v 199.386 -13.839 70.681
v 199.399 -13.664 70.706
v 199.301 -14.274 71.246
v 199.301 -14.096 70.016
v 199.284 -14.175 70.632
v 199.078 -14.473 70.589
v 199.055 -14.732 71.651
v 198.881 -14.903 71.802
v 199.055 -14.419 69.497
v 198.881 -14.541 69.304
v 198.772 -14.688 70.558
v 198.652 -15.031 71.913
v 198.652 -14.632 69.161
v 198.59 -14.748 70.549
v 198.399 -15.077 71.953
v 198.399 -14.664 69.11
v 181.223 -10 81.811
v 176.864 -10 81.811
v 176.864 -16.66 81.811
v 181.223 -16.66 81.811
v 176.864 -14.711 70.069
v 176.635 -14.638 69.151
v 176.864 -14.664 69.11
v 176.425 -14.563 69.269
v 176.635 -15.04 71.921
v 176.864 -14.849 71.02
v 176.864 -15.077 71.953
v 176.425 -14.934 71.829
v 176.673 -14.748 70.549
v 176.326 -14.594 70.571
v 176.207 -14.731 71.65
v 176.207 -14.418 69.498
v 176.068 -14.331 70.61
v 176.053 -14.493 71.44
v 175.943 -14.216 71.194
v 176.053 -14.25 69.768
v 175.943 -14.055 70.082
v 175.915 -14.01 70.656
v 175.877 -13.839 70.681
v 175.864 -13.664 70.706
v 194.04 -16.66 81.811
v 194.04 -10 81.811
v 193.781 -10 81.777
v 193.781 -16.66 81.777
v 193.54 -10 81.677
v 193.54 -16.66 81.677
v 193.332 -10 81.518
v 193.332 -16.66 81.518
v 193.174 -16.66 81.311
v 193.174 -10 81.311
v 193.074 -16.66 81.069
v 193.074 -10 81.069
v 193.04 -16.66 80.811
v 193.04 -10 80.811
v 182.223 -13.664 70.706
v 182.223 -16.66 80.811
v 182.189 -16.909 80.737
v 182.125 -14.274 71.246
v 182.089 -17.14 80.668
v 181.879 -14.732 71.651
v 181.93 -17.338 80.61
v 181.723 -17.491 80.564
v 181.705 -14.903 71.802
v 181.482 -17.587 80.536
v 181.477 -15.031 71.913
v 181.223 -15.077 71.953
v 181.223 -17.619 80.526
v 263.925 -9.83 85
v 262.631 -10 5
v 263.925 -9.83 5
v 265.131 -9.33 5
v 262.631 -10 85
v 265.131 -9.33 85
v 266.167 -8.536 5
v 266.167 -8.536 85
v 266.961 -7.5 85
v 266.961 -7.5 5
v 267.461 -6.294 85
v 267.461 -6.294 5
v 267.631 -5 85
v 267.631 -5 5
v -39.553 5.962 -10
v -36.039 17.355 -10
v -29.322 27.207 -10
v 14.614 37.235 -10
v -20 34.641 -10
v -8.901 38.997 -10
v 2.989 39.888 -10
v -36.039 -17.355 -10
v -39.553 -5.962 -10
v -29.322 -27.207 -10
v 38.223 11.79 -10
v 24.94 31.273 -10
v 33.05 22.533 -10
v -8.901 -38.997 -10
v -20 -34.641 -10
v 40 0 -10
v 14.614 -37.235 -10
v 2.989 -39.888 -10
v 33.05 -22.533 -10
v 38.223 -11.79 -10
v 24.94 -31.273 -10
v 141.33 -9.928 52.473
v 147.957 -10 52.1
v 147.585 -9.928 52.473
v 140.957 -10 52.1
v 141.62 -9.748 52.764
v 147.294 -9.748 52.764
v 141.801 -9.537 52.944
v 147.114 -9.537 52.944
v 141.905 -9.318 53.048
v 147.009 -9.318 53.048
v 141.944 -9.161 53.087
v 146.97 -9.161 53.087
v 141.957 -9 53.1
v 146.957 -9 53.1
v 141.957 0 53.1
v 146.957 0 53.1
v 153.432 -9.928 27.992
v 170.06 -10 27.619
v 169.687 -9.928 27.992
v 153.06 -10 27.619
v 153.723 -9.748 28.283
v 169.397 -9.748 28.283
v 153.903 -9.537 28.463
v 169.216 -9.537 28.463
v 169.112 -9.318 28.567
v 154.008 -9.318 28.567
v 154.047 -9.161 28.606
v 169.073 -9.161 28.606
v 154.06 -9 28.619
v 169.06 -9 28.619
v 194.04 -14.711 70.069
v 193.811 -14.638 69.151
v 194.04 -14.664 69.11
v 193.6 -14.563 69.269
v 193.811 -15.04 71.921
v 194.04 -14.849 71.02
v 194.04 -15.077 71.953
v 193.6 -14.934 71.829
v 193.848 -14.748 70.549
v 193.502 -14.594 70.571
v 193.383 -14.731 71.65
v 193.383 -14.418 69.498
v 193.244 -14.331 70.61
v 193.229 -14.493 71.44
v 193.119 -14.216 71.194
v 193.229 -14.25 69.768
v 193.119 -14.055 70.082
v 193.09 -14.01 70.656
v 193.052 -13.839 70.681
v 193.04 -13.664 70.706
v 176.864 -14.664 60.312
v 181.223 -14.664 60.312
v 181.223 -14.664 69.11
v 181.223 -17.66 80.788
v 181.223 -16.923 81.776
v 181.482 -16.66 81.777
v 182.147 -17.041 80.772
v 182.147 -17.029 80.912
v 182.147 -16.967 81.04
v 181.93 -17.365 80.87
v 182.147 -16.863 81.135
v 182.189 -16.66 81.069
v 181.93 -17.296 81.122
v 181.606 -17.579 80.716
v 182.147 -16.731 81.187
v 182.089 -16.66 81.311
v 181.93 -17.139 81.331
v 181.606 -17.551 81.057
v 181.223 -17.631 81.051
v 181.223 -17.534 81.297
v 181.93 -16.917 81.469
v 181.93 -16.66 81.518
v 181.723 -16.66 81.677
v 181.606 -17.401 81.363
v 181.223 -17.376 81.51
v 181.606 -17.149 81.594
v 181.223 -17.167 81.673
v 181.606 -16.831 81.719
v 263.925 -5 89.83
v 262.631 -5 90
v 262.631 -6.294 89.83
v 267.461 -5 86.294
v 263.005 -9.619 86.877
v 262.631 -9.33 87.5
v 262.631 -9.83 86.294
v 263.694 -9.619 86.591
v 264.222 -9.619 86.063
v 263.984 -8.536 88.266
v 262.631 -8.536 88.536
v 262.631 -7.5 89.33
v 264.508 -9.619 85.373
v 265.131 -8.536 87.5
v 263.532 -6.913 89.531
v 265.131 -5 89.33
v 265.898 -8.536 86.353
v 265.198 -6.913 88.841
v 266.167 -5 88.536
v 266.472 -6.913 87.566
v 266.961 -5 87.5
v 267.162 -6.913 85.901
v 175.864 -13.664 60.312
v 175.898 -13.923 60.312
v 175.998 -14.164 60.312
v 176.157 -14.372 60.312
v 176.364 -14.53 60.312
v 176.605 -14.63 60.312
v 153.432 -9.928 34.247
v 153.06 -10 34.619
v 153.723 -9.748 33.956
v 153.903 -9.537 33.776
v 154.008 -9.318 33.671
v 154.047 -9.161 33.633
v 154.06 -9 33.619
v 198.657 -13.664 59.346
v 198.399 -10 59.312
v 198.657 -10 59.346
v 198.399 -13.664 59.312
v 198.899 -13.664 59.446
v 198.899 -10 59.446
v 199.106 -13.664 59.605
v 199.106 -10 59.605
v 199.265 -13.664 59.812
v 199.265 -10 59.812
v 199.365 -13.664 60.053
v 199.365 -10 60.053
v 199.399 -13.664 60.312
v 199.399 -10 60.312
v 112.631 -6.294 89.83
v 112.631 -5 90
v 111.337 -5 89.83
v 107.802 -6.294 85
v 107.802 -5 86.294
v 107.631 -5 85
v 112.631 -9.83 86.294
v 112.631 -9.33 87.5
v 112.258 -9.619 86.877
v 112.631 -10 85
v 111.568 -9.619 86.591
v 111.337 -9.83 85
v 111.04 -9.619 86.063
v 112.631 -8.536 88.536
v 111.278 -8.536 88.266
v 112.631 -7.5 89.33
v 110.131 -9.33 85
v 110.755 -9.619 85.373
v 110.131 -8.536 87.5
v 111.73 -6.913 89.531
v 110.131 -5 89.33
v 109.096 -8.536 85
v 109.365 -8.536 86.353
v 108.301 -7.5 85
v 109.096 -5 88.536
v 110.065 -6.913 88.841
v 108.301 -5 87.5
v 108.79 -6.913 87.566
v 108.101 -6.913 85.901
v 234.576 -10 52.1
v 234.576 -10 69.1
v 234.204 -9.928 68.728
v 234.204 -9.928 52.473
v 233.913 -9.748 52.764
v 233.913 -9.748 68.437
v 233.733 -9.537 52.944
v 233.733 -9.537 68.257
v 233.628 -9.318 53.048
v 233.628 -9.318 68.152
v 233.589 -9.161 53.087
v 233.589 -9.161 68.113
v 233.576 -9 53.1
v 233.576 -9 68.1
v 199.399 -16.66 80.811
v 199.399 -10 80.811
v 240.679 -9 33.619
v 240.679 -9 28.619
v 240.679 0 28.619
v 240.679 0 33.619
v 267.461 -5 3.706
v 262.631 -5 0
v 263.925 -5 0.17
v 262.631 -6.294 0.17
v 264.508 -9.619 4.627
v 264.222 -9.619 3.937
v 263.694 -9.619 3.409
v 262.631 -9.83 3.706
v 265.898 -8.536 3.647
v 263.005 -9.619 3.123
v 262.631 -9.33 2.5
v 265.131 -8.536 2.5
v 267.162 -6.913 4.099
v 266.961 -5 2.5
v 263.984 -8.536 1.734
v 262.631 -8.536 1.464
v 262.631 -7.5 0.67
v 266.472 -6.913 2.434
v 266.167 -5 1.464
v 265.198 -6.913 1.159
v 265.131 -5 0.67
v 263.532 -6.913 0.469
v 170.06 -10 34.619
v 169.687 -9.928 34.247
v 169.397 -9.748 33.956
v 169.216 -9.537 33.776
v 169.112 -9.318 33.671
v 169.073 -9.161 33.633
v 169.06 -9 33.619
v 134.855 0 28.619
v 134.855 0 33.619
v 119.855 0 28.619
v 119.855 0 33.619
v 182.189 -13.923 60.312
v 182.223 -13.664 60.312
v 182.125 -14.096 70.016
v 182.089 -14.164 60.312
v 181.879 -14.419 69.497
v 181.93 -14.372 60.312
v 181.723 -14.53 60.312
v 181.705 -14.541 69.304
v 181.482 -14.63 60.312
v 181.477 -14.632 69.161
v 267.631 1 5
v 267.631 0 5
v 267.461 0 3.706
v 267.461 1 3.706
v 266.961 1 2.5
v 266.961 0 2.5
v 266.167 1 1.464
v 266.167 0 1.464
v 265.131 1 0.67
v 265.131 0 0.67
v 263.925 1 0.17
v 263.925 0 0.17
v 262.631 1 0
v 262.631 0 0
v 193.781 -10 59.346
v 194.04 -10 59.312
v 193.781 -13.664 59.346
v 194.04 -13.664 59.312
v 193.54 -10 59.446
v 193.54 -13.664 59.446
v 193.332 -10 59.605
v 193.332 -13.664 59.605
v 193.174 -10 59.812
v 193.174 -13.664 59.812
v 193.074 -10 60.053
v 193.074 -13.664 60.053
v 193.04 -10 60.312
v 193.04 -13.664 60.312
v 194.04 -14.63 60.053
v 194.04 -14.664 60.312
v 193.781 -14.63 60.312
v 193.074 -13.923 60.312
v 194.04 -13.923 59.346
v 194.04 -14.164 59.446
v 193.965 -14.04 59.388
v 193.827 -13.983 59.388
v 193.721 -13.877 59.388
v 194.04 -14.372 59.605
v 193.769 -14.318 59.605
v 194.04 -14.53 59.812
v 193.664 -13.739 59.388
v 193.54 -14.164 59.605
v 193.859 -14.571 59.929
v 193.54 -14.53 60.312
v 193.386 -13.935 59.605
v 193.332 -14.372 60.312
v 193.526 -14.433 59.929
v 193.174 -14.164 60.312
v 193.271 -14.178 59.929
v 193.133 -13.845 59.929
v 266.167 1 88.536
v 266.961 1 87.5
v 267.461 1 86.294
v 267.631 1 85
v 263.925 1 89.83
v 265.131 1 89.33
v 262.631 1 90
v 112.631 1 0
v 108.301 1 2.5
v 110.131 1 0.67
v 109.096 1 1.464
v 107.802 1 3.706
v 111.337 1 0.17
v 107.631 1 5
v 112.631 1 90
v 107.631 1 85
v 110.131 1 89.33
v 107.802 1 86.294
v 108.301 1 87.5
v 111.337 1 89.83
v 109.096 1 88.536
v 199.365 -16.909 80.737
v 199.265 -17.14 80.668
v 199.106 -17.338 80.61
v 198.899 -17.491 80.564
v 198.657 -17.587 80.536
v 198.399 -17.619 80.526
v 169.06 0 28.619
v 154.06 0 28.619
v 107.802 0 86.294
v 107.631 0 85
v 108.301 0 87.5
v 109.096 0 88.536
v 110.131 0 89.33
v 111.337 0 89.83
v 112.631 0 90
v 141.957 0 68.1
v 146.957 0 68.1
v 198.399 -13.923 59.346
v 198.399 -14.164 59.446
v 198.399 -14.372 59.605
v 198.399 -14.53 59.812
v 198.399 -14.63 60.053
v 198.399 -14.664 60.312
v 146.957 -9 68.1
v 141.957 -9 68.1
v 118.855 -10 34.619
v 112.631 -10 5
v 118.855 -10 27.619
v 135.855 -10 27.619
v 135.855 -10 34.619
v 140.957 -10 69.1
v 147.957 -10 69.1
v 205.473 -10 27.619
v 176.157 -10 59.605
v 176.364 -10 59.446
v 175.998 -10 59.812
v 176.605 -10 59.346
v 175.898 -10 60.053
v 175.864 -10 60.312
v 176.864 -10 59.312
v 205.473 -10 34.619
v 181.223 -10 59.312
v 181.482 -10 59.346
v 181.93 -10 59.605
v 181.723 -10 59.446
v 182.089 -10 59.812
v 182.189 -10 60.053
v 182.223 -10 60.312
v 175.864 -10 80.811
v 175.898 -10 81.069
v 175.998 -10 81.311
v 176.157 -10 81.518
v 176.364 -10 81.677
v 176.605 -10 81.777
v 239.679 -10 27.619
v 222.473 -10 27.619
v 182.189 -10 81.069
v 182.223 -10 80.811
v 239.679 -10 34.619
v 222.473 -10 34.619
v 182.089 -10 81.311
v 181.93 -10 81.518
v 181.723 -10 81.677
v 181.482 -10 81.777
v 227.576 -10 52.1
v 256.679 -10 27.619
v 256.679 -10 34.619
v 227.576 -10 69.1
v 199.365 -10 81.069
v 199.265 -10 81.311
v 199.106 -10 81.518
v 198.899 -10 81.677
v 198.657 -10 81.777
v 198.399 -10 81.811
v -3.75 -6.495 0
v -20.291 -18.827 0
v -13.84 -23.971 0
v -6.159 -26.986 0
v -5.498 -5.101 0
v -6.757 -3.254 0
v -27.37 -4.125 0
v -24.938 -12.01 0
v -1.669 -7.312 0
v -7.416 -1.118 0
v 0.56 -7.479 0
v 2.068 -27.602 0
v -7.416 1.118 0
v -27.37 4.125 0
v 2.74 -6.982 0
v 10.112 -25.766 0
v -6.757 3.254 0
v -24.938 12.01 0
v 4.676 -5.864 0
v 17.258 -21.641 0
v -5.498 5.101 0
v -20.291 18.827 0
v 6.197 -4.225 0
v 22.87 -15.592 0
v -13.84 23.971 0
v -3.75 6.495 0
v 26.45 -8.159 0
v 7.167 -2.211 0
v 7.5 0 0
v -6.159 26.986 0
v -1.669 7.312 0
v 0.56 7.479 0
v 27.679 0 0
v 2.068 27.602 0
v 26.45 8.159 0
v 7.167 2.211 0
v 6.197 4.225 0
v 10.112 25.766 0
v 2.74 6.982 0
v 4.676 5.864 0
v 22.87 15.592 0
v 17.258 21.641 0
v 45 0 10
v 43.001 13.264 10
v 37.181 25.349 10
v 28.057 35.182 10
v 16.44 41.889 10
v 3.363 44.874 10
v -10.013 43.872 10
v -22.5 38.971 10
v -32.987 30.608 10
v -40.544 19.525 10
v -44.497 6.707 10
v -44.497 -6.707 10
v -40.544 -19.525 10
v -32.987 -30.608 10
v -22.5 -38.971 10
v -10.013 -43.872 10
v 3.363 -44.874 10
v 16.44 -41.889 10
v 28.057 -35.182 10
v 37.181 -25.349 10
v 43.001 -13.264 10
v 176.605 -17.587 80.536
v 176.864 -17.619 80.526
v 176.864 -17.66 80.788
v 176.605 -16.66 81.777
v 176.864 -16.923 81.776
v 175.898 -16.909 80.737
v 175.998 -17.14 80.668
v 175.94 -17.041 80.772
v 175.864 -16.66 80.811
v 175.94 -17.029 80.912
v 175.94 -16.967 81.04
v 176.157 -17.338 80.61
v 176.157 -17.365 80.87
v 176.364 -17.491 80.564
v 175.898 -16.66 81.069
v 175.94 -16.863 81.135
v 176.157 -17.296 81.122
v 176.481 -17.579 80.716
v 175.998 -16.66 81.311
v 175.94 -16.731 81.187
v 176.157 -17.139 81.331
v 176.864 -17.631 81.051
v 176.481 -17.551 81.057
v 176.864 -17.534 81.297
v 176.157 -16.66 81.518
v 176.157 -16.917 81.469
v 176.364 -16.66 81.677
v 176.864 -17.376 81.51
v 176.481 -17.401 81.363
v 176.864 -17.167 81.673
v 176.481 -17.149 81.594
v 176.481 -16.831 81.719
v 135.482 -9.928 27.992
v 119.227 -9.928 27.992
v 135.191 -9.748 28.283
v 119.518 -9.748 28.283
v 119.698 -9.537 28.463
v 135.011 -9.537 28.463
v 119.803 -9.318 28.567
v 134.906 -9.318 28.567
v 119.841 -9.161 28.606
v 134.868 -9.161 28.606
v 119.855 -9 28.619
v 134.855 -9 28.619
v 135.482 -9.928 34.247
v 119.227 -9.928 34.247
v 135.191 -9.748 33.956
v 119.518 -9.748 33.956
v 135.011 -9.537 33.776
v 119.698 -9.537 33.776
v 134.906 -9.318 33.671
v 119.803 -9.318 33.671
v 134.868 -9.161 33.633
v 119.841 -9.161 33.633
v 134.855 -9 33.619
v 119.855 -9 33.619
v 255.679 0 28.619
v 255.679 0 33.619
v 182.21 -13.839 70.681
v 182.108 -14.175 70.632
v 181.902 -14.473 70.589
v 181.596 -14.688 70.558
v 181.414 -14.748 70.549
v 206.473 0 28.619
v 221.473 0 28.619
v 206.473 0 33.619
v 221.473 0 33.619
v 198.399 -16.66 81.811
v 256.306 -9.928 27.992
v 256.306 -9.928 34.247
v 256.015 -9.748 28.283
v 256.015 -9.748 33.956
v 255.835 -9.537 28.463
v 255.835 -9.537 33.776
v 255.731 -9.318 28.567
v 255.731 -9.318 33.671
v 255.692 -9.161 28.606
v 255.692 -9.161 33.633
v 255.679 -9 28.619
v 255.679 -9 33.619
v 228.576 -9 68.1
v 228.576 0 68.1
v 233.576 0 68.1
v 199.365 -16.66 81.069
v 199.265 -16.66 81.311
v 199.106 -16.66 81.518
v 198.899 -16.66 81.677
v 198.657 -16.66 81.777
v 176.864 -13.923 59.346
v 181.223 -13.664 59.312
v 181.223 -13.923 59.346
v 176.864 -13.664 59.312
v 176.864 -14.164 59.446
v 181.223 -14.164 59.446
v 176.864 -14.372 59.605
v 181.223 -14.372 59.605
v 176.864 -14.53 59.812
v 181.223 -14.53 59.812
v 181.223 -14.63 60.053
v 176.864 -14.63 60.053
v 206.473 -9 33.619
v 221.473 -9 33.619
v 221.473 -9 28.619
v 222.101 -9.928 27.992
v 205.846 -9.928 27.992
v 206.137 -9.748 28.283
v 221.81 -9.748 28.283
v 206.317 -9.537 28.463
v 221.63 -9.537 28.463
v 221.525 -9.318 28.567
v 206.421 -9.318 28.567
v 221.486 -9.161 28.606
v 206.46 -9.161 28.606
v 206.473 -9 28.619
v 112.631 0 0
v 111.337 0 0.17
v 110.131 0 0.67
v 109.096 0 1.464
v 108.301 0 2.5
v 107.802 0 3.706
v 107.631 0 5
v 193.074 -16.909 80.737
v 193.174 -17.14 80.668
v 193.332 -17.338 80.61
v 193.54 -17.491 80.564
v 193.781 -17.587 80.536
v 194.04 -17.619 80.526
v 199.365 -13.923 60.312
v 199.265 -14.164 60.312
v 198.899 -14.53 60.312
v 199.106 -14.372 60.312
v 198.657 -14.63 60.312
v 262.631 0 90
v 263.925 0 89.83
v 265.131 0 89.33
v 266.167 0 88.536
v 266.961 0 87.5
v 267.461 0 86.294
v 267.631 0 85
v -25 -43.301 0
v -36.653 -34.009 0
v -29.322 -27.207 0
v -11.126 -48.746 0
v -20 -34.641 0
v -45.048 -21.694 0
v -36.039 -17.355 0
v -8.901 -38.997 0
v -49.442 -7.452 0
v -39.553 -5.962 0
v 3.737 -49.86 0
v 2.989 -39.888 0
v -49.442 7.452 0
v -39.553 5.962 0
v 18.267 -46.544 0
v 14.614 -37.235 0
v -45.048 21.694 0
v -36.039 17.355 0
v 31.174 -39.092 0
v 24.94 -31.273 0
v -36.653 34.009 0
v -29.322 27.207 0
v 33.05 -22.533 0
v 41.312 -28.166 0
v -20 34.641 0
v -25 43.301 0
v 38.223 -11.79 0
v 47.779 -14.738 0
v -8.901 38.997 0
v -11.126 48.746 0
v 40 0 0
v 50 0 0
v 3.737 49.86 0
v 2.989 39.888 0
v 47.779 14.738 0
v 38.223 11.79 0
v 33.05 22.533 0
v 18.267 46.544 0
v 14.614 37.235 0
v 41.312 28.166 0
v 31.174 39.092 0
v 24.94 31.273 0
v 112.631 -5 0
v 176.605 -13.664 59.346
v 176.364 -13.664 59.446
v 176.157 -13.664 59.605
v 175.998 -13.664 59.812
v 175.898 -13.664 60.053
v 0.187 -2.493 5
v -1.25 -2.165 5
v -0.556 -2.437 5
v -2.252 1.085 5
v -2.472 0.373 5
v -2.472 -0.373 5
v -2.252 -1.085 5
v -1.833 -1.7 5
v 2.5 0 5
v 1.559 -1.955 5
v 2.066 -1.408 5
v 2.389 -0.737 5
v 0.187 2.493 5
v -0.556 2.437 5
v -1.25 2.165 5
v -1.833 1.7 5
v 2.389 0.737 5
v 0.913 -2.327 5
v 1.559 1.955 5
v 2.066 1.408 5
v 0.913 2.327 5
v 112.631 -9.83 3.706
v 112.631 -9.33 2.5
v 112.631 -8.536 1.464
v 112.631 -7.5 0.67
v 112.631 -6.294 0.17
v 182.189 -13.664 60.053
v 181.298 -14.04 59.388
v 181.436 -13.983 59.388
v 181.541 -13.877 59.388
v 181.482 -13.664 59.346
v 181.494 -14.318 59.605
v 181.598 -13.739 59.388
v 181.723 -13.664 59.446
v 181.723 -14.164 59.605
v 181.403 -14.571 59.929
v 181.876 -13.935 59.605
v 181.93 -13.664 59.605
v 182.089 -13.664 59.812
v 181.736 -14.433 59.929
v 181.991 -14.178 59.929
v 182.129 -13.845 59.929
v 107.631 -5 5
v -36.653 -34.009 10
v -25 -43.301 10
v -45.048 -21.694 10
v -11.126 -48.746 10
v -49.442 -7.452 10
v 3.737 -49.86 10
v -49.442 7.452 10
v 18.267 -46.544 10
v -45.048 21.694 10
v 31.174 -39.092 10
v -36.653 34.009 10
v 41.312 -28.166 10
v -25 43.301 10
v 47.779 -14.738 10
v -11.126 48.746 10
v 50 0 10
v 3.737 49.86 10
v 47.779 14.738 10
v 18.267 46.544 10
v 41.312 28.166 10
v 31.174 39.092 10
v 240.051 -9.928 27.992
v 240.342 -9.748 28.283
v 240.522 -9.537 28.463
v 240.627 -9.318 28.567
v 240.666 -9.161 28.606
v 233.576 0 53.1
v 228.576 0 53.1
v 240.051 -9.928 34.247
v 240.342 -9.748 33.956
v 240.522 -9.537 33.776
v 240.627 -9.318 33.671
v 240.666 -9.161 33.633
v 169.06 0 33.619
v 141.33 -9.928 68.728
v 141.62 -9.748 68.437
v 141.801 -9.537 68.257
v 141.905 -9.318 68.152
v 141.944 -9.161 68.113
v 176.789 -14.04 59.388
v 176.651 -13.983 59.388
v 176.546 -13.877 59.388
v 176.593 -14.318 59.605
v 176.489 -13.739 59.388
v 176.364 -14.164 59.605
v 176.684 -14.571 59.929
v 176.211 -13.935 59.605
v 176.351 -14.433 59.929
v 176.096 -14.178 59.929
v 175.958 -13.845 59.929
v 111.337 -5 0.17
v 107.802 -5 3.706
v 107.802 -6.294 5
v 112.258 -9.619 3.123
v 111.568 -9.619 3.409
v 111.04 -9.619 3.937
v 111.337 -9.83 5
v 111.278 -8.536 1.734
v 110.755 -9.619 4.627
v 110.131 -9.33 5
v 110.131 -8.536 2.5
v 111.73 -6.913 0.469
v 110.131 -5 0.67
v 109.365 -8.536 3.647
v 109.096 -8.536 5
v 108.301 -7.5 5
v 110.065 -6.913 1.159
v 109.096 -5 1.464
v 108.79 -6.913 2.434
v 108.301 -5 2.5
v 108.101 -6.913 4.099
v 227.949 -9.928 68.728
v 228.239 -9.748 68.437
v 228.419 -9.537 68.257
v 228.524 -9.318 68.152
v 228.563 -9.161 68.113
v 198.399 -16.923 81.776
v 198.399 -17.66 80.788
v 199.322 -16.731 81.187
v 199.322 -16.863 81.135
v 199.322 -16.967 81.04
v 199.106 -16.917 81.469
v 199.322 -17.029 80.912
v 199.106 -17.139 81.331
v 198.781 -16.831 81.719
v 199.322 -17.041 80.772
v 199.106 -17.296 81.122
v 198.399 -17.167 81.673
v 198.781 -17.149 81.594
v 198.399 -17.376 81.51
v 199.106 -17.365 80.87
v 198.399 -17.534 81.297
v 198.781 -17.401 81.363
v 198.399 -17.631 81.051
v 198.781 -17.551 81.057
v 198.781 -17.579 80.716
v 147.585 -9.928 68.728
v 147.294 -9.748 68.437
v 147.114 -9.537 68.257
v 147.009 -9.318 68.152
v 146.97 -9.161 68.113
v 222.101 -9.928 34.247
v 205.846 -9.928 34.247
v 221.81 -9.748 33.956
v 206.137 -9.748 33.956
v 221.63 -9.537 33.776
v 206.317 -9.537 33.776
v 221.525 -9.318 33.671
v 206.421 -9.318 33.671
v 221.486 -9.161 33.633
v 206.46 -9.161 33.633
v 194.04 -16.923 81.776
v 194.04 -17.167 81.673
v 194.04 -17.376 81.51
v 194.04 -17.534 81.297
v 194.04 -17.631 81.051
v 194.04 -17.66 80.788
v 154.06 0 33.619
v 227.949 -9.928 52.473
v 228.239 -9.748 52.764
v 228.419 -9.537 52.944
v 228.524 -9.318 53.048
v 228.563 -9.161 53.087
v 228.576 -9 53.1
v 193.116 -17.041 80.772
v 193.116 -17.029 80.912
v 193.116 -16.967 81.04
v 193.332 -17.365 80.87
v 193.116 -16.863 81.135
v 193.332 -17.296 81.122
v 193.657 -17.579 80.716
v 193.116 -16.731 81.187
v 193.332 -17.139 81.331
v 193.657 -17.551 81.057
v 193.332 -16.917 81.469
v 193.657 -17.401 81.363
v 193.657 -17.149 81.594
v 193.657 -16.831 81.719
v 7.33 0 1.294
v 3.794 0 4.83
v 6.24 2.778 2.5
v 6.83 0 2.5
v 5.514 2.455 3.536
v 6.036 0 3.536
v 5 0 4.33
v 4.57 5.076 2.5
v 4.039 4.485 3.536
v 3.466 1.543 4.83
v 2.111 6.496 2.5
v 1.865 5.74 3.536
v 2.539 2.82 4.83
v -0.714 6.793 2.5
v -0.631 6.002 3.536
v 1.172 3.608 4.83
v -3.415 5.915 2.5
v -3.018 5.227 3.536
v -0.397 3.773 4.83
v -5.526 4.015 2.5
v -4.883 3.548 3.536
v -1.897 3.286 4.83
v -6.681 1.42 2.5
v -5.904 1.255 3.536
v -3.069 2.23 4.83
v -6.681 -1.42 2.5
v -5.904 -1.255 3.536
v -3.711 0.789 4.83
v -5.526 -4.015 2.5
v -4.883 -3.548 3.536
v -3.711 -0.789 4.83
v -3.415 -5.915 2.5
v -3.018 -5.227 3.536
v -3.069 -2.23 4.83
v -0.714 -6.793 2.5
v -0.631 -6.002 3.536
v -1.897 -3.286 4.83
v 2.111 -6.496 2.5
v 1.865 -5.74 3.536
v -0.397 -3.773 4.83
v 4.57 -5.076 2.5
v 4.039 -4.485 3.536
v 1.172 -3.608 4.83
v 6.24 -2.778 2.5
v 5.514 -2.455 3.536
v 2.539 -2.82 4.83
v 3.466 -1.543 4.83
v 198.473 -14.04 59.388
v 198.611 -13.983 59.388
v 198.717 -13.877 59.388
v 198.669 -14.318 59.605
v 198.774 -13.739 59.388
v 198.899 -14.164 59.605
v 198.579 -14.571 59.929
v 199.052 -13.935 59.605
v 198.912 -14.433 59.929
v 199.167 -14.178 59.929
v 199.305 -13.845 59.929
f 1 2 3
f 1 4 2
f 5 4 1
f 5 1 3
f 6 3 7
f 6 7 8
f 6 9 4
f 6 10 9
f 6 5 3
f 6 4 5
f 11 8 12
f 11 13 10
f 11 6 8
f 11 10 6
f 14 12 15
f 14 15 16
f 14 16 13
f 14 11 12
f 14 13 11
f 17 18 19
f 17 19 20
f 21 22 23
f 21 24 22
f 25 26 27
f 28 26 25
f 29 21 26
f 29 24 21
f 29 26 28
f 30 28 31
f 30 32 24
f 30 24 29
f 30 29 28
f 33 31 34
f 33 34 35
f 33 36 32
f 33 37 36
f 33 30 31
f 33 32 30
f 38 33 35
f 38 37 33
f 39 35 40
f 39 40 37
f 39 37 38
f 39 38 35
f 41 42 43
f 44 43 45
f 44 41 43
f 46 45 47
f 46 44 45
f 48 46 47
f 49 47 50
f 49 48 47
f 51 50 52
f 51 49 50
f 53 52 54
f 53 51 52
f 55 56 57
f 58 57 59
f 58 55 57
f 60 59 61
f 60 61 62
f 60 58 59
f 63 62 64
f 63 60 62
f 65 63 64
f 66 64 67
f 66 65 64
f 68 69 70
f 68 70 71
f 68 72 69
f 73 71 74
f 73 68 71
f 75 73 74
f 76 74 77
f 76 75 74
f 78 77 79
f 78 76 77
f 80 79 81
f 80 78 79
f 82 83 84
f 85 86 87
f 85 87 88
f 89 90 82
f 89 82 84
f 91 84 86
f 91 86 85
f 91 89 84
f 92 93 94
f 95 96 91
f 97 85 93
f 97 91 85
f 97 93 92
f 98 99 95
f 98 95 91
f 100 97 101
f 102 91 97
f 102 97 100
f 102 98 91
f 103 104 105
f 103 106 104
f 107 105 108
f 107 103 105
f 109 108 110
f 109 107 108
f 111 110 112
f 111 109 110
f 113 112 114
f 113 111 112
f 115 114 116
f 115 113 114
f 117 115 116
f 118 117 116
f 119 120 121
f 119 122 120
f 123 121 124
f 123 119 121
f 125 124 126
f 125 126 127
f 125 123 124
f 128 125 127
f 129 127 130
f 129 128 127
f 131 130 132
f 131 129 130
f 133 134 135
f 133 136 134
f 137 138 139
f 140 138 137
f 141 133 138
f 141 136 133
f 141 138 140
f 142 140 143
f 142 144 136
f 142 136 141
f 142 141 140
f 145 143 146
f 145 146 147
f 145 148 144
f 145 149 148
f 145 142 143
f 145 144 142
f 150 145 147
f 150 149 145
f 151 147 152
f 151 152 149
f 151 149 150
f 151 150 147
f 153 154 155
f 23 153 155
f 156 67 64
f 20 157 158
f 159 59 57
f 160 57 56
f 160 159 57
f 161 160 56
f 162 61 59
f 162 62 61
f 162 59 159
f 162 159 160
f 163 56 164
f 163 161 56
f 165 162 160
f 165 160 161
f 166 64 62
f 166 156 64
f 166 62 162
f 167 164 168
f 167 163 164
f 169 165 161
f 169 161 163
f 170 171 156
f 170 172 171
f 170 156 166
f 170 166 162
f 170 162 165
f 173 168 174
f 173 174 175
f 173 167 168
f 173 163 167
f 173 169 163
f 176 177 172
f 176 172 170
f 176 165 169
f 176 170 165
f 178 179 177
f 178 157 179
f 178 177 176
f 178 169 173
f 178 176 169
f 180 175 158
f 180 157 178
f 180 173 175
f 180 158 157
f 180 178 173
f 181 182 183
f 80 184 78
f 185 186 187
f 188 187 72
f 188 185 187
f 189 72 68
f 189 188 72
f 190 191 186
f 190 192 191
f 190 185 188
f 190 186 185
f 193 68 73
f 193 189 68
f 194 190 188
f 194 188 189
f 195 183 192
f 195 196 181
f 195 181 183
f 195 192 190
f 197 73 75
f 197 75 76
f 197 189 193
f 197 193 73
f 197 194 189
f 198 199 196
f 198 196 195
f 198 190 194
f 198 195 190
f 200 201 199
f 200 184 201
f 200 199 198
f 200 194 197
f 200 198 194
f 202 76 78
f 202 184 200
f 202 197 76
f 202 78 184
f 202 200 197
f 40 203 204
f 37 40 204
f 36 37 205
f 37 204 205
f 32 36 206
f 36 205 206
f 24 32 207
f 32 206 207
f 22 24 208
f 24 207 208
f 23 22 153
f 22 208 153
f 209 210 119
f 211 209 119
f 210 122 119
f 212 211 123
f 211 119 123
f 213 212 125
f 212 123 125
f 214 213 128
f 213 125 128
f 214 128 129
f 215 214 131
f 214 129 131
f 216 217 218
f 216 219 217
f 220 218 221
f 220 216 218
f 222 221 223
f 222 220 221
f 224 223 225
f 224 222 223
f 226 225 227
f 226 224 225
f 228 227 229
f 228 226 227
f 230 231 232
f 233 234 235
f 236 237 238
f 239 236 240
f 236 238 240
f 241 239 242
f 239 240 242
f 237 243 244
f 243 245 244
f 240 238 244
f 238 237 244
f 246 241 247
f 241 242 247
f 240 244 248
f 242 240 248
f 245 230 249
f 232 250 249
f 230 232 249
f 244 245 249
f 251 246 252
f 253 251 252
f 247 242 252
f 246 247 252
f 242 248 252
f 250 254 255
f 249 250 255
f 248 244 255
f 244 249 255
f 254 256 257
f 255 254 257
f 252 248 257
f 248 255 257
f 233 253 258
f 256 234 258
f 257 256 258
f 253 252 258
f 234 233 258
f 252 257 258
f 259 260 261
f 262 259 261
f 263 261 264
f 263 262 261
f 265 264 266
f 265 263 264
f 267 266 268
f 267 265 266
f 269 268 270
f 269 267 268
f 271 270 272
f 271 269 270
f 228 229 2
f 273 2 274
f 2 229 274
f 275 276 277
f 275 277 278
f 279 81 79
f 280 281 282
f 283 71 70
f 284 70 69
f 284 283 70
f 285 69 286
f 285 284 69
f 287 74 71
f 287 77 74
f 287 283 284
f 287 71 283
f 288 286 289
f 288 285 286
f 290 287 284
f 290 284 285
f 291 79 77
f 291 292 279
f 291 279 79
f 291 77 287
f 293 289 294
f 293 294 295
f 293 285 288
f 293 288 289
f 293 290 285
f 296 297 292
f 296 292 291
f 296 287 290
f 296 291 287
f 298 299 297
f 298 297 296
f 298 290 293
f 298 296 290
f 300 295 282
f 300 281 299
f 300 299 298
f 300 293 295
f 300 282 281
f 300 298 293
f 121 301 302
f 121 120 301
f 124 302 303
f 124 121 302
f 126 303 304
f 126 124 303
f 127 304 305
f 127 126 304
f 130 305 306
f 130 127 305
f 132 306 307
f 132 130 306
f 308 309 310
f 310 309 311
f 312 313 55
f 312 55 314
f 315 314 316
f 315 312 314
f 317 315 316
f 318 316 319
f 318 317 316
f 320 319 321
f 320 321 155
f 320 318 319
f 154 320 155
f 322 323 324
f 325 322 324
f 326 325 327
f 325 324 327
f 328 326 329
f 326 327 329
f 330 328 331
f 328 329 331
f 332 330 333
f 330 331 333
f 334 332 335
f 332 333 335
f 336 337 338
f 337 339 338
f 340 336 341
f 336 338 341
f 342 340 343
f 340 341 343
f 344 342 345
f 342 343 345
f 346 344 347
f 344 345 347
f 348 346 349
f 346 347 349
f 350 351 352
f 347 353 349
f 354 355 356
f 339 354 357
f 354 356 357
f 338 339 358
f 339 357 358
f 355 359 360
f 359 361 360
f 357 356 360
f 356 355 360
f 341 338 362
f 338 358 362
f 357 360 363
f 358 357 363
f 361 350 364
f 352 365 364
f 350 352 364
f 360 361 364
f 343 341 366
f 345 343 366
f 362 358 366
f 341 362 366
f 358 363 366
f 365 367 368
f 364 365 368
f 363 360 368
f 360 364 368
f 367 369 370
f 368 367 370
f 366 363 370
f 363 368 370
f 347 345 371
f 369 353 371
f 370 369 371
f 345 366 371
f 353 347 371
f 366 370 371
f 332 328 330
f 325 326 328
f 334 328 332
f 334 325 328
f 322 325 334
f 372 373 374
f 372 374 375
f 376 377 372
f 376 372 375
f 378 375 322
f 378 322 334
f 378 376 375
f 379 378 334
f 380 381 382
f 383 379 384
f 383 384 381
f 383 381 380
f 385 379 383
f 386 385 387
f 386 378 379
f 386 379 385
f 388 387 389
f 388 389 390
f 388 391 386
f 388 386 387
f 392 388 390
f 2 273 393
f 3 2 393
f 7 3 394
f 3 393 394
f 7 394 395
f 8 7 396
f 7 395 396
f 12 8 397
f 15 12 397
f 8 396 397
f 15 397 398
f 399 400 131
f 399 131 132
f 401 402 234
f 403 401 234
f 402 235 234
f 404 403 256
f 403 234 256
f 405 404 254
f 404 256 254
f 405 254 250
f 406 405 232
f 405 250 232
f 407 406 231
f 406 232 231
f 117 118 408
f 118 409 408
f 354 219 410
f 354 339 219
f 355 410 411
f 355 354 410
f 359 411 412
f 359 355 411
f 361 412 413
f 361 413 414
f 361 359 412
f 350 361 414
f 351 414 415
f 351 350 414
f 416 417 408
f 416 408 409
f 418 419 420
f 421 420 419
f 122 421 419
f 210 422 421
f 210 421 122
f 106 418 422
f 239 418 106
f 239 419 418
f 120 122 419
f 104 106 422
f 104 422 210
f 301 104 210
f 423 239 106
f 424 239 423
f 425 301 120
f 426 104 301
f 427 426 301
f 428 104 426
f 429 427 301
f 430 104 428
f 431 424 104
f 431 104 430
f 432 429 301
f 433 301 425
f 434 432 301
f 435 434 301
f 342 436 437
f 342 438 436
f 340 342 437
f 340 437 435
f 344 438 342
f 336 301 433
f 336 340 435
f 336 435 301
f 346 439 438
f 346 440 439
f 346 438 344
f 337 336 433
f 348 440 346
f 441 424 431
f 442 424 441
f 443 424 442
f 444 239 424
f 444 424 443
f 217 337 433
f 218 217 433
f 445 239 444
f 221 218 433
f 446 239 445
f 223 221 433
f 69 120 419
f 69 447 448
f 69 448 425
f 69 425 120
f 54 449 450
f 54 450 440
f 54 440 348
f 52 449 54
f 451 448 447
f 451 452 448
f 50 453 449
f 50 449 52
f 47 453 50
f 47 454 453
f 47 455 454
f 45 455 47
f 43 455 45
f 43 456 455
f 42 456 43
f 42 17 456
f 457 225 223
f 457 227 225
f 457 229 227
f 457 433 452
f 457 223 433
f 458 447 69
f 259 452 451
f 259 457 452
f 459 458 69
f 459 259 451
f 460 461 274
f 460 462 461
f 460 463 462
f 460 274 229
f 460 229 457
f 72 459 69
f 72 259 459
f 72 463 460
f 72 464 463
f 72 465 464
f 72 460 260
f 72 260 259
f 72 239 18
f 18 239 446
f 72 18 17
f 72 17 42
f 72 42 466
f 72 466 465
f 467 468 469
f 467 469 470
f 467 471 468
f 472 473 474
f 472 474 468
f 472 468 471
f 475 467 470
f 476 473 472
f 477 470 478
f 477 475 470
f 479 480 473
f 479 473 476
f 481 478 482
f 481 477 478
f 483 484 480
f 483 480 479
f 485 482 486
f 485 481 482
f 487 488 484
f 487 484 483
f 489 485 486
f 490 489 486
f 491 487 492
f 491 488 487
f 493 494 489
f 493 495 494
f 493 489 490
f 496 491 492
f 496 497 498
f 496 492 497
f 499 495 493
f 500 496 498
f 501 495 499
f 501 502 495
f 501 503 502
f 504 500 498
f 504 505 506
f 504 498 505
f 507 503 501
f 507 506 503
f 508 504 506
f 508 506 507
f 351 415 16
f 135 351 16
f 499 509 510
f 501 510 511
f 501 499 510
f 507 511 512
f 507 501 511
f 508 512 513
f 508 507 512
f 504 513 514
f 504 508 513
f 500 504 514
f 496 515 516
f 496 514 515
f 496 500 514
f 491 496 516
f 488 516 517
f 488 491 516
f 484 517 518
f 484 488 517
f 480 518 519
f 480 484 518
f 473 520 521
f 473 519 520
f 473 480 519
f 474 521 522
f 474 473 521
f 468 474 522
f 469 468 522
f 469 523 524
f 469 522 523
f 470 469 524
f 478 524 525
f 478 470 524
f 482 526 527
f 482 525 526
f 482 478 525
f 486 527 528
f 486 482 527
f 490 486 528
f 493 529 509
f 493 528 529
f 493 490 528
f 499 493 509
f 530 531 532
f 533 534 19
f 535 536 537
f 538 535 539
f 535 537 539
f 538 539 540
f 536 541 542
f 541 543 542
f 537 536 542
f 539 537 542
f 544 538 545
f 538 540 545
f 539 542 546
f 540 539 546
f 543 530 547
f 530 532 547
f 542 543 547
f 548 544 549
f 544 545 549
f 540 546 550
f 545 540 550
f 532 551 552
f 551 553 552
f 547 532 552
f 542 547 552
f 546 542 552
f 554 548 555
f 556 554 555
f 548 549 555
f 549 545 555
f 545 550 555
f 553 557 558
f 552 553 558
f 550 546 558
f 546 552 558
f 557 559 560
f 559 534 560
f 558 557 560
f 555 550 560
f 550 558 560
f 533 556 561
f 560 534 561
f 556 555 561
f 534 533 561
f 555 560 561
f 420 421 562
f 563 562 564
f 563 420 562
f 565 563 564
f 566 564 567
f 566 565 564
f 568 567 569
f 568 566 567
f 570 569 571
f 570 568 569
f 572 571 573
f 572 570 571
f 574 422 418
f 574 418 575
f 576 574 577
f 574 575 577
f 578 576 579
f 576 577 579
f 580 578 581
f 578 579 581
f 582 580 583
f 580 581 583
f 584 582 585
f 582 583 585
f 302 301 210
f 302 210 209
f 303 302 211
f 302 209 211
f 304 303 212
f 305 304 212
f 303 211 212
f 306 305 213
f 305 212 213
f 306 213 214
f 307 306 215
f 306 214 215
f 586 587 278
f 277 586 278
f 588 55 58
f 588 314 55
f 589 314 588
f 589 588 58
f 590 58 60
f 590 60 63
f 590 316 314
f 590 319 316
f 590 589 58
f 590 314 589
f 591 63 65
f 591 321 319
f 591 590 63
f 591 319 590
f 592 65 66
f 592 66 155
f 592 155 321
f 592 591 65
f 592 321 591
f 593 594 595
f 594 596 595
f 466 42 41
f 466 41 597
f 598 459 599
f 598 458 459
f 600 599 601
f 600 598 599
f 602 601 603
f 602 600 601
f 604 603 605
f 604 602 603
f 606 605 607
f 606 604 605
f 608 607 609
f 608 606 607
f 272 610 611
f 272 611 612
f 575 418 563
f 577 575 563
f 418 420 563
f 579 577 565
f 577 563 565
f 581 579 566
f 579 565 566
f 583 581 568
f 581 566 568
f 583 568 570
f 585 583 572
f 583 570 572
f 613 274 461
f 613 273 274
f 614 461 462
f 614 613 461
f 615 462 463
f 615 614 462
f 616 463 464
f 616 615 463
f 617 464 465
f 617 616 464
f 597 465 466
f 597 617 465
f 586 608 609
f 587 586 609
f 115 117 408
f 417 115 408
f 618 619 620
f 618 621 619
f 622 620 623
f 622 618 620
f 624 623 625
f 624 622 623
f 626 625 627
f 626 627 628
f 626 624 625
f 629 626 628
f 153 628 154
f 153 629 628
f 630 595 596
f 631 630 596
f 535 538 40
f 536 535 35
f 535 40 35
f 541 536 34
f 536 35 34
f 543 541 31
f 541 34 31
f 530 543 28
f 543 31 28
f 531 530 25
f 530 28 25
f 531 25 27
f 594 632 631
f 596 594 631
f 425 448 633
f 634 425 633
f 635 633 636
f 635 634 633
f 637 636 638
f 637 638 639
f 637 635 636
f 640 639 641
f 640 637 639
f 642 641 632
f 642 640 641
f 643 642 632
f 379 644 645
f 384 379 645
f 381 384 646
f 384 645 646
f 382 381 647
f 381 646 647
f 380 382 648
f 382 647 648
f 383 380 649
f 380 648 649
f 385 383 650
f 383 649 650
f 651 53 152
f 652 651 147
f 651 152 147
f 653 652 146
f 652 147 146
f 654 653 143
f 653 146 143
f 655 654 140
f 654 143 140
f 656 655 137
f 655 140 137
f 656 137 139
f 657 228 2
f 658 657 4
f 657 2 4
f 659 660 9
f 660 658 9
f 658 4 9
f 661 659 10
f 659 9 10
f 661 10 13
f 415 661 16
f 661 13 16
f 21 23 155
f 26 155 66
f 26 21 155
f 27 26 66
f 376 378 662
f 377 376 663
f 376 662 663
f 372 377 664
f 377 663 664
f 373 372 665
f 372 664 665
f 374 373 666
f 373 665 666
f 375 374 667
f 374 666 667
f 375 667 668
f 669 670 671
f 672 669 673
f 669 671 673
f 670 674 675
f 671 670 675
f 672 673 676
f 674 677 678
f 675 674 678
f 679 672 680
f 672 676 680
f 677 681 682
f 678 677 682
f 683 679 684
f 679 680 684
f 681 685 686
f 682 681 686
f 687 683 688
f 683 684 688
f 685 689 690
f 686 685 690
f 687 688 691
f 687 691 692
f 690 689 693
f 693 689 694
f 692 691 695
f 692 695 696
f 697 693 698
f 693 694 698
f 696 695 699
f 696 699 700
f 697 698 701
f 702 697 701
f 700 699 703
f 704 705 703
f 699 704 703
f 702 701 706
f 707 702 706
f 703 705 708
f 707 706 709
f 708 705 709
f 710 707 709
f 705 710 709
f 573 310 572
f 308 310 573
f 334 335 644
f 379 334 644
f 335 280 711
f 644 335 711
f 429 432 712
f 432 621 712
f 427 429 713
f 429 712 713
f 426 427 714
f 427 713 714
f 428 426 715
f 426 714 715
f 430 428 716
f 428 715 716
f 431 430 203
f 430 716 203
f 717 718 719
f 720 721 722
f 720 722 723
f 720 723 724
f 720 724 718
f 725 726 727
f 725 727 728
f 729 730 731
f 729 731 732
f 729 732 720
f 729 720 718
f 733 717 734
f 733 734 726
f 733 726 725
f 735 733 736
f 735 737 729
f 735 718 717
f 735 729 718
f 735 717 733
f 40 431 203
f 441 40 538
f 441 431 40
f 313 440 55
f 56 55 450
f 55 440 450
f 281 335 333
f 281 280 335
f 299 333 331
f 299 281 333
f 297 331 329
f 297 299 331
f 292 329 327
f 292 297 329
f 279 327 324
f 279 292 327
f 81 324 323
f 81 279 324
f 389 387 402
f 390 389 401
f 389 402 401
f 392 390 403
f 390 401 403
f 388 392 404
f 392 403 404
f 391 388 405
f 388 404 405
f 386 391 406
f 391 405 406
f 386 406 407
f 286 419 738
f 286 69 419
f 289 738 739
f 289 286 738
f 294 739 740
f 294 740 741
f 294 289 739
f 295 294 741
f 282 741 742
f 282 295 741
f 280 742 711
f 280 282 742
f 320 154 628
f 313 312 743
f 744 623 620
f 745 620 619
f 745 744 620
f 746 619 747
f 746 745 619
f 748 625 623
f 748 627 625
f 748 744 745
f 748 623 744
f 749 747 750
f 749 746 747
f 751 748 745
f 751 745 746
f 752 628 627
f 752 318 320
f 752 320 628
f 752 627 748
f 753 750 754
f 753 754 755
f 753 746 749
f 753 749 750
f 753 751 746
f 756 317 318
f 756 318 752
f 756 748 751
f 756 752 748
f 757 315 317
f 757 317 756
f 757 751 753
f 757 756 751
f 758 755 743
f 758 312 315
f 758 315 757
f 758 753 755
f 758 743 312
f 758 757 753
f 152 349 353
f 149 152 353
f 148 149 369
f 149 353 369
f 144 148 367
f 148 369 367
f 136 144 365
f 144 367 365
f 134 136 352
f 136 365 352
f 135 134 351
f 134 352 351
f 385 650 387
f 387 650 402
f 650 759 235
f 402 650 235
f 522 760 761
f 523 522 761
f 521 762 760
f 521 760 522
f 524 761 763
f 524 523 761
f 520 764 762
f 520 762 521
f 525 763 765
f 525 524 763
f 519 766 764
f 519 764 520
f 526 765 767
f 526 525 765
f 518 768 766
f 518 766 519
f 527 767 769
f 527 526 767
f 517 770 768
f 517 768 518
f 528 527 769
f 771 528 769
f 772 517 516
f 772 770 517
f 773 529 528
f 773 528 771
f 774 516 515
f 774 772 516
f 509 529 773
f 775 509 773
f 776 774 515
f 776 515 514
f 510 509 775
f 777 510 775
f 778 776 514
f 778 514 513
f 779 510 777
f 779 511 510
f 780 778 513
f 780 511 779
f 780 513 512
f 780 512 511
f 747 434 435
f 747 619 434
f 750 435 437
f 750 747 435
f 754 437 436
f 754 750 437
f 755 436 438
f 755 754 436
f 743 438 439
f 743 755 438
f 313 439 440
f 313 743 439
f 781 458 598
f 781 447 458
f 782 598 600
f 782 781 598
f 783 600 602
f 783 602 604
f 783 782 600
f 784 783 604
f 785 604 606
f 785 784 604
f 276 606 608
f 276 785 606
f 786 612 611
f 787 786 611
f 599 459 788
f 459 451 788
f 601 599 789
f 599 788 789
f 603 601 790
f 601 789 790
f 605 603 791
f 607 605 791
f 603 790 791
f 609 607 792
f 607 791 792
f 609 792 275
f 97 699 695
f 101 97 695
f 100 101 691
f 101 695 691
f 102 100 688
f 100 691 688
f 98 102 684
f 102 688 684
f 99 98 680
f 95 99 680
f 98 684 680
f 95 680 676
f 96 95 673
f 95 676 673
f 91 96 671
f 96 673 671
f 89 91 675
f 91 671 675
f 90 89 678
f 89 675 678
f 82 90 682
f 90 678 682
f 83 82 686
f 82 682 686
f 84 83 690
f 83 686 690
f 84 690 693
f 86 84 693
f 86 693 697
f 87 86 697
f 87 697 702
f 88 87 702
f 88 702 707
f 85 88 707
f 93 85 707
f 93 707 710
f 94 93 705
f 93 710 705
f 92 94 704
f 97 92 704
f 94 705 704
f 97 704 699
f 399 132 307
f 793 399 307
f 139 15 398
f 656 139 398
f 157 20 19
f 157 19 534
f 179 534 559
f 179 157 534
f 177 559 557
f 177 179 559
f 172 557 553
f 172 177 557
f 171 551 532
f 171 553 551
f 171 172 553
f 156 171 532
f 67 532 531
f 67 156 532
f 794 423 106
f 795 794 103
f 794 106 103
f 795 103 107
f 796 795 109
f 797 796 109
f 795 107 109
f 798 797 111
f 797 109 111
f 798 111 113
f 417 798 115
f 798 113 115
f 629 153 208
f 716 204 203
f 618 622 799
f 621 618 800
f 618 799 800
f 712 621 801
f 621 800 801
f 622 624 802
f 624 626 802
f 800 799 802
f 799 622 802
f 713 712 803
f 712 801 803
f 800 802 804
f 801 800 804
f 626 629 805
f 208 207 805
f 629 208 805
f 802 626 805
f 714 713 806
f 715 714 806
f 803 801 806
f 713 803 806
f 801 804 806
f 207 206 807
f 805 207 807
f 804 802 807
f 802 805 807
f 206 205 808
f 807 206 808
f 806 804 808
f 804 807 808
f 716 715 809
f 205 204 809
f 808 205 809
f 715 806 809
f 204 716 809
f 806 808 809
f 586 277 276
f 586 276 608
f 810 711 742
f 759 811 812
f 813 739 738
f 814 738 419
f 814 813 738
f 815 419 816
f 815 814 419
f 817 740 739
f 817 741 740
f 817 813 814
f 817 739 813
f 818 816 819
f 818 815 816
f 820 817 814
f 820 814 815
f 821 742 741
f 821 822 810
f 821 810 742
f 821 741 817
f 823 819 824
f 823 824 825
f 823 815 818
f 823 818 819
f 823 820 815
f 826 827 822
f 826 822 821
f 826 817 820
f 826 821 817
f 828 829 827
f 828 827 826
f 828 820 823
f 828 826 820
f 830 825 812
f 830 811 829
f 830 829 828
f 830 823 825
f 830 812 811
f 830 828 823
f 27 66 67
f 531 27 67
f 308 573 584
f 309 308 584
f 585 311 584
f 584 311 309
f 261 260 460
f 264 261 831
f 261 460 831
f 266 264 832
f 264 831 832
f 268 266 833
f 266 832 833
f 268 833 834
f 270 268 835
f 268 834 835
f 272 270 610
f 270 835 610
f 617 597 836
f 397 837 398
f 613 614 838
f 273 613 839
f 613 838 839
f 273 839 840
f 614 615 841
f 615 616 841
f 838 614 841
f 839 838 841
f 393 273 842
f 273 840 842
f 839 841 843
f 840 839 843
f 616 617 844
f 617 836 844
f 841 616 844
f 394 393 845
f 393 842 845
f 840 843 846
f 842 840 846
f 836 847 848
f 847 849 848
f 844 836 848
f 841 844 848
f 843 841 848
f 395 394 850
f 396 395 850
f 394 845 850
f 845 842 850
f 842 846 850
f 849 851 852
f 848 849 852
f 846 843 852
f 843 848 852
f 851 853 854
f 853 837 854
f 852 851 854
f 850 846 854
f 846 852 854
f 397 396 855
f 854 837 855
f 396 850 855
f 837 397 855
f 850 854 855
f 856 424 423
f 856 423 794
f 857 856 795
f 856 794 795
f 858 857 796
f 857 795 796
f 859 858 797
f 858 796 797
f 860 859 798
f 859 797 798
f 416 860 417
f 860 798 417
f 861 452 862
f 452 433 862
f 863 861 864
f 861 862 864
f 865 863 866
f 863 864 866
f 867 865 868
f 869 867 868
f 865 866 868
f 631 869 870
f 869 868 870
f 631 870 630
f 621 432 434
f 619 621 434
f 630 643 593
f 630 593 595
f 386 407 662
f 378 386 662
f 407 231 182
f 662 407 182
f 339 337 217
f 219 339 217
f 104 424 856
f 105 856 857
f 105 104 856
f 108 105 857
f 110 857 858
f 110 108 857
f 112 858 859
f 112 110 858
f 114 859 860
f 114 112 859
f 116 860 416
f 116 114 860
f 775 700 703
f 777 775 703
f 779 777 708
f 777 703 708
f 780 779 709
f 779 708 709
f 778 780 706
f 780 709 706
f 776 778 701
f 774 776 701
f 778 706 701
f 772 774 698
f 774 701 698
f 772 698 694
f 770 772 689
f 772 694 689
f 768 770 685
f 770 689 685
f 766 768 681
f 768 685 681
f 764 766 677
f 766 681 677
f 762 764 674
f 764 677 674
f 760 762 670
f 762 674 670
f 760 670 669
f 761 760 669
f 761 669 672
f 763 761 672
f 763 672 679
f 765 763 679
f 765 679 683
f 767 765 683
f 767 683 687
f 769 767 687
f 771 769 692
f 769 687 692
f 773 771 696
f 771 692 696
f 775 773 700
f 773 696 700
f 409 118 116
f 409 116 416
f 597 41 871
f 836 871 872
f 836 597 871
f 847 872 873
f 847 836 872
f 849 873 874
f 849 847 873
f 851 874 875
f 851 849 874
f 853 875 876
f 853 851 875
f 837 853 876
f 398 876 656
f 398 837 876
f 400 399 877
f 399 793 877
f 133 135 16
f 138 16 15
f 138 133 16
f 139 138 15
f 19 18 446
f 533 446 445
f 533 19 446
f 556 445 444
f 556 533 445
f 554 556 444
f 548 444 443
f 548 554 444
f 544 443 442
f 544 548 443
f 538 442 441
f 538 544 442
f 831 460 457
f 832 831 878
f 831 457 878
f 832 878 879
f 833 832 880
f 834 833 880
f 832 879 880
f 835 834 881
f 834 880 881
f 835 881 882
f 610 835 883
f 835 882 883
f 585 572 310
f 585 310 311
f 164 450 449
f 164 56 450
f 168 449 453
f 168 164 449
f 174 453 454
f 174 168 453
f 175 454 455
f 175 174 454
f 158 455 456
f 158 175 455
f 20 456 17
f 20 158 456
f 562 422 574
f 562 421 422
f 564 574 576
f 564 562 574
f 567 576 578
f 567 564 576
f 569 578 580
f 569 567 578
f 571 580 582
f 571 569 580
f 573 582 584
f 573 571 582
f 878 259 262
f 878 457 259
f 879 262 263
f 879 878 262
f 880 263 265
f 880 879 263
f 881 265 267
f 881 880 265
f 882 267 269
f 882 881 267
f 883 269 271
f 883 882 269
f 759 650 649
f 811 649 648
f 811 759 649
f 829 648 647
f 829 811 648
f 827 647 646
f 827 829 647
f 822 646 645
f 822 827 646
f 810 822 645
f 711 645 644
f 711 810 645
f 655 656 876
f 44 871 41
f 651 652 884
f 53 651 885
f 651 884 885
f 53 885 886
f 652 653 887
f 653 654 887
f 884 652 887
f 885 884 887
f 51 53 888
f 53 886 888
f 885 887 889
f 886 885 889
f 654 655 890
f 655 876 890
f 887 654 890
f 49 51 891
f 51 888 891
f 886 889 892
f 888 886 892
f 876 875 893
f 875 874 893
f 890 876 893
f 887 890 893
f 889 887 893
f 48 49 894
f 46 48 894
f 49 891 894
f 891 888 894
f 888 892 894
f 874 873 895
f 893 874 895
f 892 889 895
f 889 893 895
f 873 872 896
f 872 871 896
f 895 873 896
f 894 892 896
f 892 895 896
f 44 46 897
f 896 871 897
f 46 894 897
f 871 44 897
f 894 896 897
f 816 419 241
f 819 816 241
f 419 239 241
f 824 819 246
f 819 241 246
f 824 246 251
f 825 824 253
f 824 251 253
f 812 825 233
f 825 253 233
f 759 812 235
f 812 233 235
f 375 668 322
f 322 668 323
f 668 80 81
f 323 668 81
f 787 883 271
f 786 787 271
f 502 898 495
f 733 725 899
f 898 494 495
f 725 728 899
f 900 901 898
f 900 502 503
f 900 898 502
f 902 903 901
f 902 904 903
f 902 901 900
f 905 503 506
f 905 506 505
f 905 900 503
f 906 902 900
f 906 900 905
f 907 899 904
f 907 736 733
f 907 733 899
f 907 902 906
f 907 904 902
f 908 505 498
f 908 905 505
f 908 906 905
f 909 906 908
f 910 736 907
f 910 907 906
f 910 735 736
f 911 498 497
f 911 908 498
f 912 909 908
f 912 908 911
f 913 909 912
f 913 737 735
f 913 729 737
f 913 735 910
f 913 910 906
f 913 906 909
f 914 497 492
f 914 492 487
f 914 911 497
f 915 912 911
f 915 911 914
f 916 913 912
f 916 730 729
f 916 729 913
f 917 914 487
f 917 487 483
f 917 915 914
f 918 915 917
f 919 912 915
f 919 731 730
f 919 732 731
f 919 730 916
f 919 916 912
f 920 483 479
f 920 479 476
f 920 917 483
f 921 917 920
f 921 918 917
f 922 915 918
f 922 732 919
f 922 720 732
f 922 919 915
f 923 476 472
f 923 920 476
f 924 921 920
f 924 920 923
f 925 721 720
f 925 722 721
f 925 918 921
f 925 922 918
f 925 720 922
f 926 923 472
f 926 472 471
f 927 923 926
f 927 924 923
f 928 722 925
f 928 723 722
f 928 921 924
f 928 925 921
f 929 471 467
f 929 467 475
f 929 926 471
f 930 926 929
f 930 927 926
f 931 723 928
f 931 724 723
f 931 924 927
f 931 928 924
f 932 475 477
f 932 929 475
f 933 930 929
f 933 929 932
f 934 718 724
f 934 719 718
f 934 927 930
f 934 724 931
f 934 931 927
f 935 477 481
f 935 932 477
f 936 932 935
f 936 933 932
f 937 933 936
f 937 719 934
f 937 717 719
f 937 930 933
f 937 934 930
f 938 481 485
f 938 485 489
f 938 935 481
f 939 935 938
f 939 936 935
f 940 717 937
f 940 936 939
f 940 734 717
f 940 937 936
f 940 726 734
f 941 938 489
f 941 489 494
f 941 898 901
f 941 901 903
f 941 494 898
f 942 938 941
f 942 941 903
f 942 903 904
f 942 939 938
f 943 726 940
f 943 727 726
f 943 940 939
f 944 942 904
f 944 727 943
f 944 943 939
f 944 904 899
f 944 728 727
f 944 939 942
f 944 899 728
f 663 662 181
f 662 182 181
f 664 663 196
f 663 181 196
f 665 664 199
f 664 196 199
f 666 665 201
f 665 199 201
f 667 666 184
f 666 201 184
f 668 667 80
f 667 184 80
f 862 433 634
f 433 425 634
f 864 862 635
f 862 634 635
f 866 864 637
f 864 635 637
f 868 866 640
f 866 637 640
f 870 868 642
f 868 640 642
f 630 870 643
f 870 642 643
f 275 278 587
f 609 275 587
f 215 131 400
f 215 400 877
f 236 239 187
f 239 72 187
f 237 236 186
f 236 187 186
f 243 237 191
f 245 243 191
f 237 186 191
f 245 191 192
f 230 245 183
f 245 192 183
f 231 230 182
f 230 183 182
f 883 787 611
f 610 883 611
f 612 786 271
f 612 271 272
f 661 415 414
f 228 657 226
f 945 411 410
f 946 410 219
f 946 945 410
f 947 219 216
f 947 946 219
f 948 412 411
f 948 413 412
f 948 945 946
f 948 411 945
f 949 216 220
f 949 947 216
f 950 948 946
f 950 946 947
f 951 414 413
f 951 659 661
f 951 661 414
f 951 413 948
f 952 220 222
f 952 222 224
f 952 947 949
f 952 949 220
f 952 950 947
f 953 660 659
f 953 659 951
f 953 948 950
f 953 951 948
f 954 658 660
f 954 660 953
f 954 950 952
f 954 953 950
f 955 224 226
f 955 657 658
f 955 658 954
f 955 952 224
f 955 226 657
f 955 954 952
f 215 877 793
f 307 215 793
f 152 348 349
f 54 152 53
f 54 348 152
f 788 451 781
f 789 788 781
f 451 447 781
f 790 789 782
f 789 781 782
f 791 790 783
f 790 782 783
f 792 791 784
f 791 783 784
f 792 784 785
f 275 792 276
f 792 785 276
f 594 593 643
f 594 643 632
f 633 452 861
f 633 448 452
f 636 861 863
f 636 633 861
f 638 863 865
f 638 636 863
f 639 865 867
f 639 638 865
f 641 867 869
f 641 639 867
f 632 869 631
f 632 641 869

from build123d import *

# Parameters (mm, degrees)
F0_R      = 50
F1_DEPTH  = 10
F2_R      = 40
F3_DEPTH  = 10
F4_R      = 45
F5_DEPTH  = 10
F5_TAPER  = 60
F6_R      = 7.5
F7_DEPTH  = 5
F8_R      = 4.99999
F9_W      = 160
F9_H      = 90
F10_DEPTH = 10
F11_W     = 5
F11_H     = 15
F11_W_2   = 15
F11_H_2   = 5
F12_DEPTH = 15
F13_W     = 6.3590165973
F13_H     = 22.4987007678
F14_DEPTH = 8
F16_DEPTH = 25
F17_R     = 1
F18_R     = 10
F19_R     = 1
F20_R     = 5
F22_DEPTH = 1


# Not quite as in the source:
# - a fillet or chamfer is up to 0.001 mm smaller than in the source, because OpenCascade refuses the exact size


with BuildPart() as f1:
    # F0 (on Top) → F1 (new body)
    with BuildSketch(Plane.XY):
        Circle(F0_R)
    extrude(amount=F1_DEPTH)

    # F2 (on face) → F3 (join)
    with BuildSketch(Plane(origin=(0, 0, 0), x_dir=(1, 0, 0), z_dir=(0, 0, -1))):
        Circle(F2_R)
    extrude(amount=F3_DEPTH)

    # F4 (on face) → F5 (cut)
    with BuildSketch(Plane.XY.offset(10)):
        Circle(F4_R)
    extrude(amount=-F5_DEPTH, taper=F5_TAPER, mode=Mode.SUBTRACT)

    # F6 (on face) → F7 (join)
    with BuildSketch(Plane.XY):
        Circle(F6_R)
    extrude(amount=F7_DEPTH)

    # F8 (radius 5 in the source; OpenCascade refuses exactly that, so slightly less here)
    f8_edges = [f1.edges().sort_by_distance(p)[0] for p in [
        (-7.5, 0, 5),
    ]]
    fillet(f8_edges, radius=F8_R)


with BuildPart() as f10:
    # F9 (on Front) → F10 (new body)
    with BuildSketch(Plane.XZ):
        with Locations((187.6312586665, 45)):
            Rectangle(F9_W, F9_H)
    extrude(amount=F10_DEPTH)

    # F11 (on Front) → F12 (cut)
    with BuildSketch(Plane.XZ):
        with Locations((144.4571614265, 60.6002969737)):
            Rectangle(F11_W, F11_H)
        with Locations((127.3545090962, 31.1194501932)):
            Rectangle(F11_W_2, F11_H_2)
        with Locations((161.5598137569, 31.1194501932)):
            Rectangle(F11_W_2, F11_H_2)
        with Locations((231.0760170221, 60.6002969737)):
            Rectangle(F11_W, F11_H)
        with Locations((213.9733646918, 31.1194501932)):
            Rectangle(F11_W_2, F11_H_2)
        with Locations((248.1786693525, 31.1194501932)):
            Rectangle(F11_W_2, F11_H_2)
    extrude(amount=F12_DEPTH, mode=Mode.SUBTRACT)

    # F13 (on face) → F14 (join)
    with BuildSketch(Plane.XZ.offset(10)):
        with Locations((196.219098717, 70.5612506717)):
            Rectangle(F13_W, F13_H)
        with Locations((179.0434186161, 70.5612506717)):
            Rectangle(F13_W, F13_H)
    extrude(amount=F14_DEPTH)

    # F15 (on face) → F16 (cut)
    with BuildSketch(Plane.YZ.offset(199.3986070156)):
        Polygon((-14.6644348279, 59.3119002879), (-14.6644348279, 70.5612506717), (-18, 81.8106010556), (-18, 59.3119002879), align=None)
    extrude(amount=-F16_DEPTH, mode=Mode.SUBTRACT)

    # F17
    f17_edges = [f10.edges().sort_by_distance(p)[0] for p in [
        (199.398607, -14.664435, 64.936575),
        (199.398607, -16.332217, 76.185926),
        (196.219099, -18, 81.810601),
        (179.043419, -18, 81.810601),
        (193.03959, -16.332217, 76.185926),
        (193.03959, -14.664435, 64.936575),
        (196.219099, -14.664435, 59.3119),
        (199.398607, -14, 81.810601),
        (199.398607, -12.332217, 59.3119),
        (193.03959, -12.332217, 59.3119),
        (193.03959, -14, 81.810601),
        (182.222927, -14.664435, 64.936575),
        (182.222927, -16.332217, 76.185926),
        (175.86391, -16.332217, 76.185926),
        (175.86391, -14.664435, 64.936575),
        (179.043419, -14.664435, 59.3119),
        (175.86391, -12.332217, 59.3119),
        (182.222927, -12.332217, 59.3119),
        (182.222927, -14, 81.810601),
        (175.86391, -14, 81.810601),
    ]]
    fillet(f17_edges, radius=F17_R)

    # F18
    f18_edges = [f10.edges().sort_by_distance(p)[0] for p in [
        (179.043419, -14.664435, 70.561251),
        (196.219099, -14.664435, 70.561251),
    ]]
    fillet(f18_edges, radius=F18_R)

    # F19
    f19_edges = [f10.edges().sort_by_distance(p)[0] for p in [
        (141.957161, -10, 60.600297),
        (144.457161, -10, 53.100297),
        (146.957161, -10, 60.600297),
        (144.457161, -10, 68.100297),
        (127.354509, -10, 33.61945),
        (119.854509, -10, 31.11945),
        (127.354509, -10, 28.61945),
        (134.854509, -10, 31.11945),
        (154.059814, -10, 31.11945),
        (161.559814, -10, 33.61945),
        (169.059814, -10, 31.11945),
        (161.559814, -10, 28.61945),
        (213.973365, -10, 28.61945),
        (213.973365, -10, 33.61945),
        (206.473365, -10, 31.11945),
        (221.473365, -10, 31.11945),
        (248.178669, -10, 33.61945),
        (240.678669, -10, 31.11945),
        (248.178669, -10, 28.61945),
        (255.678669, -10, 31.11945),
        (231.076017, -10, 68.100297),
        (228.576017, -10, 60.600297),
        (231.076017, -10, 53.100297),
        (233.576017, -10, 60.600297),
    ]]
    fillet(f19_edges, radius=F19_R)

    # F20
    f20_edges = [f10.edges().sort_by_distance(p)[0] for p in [
        (267.631259, -5, 90),
        (107.631259, -5, 90),
        (107.631259, -5, 0),
        (267.631259, -5, 0),
        (187.631259, -10, 90),
        (267.631259, -10, 45),
        (187.631259, -10, 0),
        (107.631259, -10, 45),
    ]]
    fillet(f20_edges, radius=F20_R)

    # F21 (on face) → F22 (join)
    with BuildSketch(Plane(origin=(0, 0, 0), x_dir=(-1, 0, 0), z_dir=(0, 1, 0))):
        with BuildLine():
            Line((-262.6312586665, 0), (-112.6312586665, 0))
            ThreePointArc((-112.6312586665, 0), (-109.0957247606, 1.4644660941), (-107.6312586665, 5))
            Line((-107.6312586665, 5), (-107.6312586665, 85))
            ThreePointArc((-107.6312586665, 85), (-109.0957247606, 88.5355339059), (-112.6312586665, 90))
            Line((-112.6312586665, 90), (-262.6312586665, 90))
            ThreePointArc((-262.6312586665, 90), (-266.1667925724, 88.5355339059), (-267.6312586665, 85))
            Line((-267.6312586665, 85), (-267.6312586665, 5))
            ThreePointArc((-267.6312586665, 5), (-266.1667925724, 1.4644660941), (-262.6312586665, 0))
        make_face()
    extrude(amount=F22_DEPTH)


solid = Compound([f1.part, f10.part])
